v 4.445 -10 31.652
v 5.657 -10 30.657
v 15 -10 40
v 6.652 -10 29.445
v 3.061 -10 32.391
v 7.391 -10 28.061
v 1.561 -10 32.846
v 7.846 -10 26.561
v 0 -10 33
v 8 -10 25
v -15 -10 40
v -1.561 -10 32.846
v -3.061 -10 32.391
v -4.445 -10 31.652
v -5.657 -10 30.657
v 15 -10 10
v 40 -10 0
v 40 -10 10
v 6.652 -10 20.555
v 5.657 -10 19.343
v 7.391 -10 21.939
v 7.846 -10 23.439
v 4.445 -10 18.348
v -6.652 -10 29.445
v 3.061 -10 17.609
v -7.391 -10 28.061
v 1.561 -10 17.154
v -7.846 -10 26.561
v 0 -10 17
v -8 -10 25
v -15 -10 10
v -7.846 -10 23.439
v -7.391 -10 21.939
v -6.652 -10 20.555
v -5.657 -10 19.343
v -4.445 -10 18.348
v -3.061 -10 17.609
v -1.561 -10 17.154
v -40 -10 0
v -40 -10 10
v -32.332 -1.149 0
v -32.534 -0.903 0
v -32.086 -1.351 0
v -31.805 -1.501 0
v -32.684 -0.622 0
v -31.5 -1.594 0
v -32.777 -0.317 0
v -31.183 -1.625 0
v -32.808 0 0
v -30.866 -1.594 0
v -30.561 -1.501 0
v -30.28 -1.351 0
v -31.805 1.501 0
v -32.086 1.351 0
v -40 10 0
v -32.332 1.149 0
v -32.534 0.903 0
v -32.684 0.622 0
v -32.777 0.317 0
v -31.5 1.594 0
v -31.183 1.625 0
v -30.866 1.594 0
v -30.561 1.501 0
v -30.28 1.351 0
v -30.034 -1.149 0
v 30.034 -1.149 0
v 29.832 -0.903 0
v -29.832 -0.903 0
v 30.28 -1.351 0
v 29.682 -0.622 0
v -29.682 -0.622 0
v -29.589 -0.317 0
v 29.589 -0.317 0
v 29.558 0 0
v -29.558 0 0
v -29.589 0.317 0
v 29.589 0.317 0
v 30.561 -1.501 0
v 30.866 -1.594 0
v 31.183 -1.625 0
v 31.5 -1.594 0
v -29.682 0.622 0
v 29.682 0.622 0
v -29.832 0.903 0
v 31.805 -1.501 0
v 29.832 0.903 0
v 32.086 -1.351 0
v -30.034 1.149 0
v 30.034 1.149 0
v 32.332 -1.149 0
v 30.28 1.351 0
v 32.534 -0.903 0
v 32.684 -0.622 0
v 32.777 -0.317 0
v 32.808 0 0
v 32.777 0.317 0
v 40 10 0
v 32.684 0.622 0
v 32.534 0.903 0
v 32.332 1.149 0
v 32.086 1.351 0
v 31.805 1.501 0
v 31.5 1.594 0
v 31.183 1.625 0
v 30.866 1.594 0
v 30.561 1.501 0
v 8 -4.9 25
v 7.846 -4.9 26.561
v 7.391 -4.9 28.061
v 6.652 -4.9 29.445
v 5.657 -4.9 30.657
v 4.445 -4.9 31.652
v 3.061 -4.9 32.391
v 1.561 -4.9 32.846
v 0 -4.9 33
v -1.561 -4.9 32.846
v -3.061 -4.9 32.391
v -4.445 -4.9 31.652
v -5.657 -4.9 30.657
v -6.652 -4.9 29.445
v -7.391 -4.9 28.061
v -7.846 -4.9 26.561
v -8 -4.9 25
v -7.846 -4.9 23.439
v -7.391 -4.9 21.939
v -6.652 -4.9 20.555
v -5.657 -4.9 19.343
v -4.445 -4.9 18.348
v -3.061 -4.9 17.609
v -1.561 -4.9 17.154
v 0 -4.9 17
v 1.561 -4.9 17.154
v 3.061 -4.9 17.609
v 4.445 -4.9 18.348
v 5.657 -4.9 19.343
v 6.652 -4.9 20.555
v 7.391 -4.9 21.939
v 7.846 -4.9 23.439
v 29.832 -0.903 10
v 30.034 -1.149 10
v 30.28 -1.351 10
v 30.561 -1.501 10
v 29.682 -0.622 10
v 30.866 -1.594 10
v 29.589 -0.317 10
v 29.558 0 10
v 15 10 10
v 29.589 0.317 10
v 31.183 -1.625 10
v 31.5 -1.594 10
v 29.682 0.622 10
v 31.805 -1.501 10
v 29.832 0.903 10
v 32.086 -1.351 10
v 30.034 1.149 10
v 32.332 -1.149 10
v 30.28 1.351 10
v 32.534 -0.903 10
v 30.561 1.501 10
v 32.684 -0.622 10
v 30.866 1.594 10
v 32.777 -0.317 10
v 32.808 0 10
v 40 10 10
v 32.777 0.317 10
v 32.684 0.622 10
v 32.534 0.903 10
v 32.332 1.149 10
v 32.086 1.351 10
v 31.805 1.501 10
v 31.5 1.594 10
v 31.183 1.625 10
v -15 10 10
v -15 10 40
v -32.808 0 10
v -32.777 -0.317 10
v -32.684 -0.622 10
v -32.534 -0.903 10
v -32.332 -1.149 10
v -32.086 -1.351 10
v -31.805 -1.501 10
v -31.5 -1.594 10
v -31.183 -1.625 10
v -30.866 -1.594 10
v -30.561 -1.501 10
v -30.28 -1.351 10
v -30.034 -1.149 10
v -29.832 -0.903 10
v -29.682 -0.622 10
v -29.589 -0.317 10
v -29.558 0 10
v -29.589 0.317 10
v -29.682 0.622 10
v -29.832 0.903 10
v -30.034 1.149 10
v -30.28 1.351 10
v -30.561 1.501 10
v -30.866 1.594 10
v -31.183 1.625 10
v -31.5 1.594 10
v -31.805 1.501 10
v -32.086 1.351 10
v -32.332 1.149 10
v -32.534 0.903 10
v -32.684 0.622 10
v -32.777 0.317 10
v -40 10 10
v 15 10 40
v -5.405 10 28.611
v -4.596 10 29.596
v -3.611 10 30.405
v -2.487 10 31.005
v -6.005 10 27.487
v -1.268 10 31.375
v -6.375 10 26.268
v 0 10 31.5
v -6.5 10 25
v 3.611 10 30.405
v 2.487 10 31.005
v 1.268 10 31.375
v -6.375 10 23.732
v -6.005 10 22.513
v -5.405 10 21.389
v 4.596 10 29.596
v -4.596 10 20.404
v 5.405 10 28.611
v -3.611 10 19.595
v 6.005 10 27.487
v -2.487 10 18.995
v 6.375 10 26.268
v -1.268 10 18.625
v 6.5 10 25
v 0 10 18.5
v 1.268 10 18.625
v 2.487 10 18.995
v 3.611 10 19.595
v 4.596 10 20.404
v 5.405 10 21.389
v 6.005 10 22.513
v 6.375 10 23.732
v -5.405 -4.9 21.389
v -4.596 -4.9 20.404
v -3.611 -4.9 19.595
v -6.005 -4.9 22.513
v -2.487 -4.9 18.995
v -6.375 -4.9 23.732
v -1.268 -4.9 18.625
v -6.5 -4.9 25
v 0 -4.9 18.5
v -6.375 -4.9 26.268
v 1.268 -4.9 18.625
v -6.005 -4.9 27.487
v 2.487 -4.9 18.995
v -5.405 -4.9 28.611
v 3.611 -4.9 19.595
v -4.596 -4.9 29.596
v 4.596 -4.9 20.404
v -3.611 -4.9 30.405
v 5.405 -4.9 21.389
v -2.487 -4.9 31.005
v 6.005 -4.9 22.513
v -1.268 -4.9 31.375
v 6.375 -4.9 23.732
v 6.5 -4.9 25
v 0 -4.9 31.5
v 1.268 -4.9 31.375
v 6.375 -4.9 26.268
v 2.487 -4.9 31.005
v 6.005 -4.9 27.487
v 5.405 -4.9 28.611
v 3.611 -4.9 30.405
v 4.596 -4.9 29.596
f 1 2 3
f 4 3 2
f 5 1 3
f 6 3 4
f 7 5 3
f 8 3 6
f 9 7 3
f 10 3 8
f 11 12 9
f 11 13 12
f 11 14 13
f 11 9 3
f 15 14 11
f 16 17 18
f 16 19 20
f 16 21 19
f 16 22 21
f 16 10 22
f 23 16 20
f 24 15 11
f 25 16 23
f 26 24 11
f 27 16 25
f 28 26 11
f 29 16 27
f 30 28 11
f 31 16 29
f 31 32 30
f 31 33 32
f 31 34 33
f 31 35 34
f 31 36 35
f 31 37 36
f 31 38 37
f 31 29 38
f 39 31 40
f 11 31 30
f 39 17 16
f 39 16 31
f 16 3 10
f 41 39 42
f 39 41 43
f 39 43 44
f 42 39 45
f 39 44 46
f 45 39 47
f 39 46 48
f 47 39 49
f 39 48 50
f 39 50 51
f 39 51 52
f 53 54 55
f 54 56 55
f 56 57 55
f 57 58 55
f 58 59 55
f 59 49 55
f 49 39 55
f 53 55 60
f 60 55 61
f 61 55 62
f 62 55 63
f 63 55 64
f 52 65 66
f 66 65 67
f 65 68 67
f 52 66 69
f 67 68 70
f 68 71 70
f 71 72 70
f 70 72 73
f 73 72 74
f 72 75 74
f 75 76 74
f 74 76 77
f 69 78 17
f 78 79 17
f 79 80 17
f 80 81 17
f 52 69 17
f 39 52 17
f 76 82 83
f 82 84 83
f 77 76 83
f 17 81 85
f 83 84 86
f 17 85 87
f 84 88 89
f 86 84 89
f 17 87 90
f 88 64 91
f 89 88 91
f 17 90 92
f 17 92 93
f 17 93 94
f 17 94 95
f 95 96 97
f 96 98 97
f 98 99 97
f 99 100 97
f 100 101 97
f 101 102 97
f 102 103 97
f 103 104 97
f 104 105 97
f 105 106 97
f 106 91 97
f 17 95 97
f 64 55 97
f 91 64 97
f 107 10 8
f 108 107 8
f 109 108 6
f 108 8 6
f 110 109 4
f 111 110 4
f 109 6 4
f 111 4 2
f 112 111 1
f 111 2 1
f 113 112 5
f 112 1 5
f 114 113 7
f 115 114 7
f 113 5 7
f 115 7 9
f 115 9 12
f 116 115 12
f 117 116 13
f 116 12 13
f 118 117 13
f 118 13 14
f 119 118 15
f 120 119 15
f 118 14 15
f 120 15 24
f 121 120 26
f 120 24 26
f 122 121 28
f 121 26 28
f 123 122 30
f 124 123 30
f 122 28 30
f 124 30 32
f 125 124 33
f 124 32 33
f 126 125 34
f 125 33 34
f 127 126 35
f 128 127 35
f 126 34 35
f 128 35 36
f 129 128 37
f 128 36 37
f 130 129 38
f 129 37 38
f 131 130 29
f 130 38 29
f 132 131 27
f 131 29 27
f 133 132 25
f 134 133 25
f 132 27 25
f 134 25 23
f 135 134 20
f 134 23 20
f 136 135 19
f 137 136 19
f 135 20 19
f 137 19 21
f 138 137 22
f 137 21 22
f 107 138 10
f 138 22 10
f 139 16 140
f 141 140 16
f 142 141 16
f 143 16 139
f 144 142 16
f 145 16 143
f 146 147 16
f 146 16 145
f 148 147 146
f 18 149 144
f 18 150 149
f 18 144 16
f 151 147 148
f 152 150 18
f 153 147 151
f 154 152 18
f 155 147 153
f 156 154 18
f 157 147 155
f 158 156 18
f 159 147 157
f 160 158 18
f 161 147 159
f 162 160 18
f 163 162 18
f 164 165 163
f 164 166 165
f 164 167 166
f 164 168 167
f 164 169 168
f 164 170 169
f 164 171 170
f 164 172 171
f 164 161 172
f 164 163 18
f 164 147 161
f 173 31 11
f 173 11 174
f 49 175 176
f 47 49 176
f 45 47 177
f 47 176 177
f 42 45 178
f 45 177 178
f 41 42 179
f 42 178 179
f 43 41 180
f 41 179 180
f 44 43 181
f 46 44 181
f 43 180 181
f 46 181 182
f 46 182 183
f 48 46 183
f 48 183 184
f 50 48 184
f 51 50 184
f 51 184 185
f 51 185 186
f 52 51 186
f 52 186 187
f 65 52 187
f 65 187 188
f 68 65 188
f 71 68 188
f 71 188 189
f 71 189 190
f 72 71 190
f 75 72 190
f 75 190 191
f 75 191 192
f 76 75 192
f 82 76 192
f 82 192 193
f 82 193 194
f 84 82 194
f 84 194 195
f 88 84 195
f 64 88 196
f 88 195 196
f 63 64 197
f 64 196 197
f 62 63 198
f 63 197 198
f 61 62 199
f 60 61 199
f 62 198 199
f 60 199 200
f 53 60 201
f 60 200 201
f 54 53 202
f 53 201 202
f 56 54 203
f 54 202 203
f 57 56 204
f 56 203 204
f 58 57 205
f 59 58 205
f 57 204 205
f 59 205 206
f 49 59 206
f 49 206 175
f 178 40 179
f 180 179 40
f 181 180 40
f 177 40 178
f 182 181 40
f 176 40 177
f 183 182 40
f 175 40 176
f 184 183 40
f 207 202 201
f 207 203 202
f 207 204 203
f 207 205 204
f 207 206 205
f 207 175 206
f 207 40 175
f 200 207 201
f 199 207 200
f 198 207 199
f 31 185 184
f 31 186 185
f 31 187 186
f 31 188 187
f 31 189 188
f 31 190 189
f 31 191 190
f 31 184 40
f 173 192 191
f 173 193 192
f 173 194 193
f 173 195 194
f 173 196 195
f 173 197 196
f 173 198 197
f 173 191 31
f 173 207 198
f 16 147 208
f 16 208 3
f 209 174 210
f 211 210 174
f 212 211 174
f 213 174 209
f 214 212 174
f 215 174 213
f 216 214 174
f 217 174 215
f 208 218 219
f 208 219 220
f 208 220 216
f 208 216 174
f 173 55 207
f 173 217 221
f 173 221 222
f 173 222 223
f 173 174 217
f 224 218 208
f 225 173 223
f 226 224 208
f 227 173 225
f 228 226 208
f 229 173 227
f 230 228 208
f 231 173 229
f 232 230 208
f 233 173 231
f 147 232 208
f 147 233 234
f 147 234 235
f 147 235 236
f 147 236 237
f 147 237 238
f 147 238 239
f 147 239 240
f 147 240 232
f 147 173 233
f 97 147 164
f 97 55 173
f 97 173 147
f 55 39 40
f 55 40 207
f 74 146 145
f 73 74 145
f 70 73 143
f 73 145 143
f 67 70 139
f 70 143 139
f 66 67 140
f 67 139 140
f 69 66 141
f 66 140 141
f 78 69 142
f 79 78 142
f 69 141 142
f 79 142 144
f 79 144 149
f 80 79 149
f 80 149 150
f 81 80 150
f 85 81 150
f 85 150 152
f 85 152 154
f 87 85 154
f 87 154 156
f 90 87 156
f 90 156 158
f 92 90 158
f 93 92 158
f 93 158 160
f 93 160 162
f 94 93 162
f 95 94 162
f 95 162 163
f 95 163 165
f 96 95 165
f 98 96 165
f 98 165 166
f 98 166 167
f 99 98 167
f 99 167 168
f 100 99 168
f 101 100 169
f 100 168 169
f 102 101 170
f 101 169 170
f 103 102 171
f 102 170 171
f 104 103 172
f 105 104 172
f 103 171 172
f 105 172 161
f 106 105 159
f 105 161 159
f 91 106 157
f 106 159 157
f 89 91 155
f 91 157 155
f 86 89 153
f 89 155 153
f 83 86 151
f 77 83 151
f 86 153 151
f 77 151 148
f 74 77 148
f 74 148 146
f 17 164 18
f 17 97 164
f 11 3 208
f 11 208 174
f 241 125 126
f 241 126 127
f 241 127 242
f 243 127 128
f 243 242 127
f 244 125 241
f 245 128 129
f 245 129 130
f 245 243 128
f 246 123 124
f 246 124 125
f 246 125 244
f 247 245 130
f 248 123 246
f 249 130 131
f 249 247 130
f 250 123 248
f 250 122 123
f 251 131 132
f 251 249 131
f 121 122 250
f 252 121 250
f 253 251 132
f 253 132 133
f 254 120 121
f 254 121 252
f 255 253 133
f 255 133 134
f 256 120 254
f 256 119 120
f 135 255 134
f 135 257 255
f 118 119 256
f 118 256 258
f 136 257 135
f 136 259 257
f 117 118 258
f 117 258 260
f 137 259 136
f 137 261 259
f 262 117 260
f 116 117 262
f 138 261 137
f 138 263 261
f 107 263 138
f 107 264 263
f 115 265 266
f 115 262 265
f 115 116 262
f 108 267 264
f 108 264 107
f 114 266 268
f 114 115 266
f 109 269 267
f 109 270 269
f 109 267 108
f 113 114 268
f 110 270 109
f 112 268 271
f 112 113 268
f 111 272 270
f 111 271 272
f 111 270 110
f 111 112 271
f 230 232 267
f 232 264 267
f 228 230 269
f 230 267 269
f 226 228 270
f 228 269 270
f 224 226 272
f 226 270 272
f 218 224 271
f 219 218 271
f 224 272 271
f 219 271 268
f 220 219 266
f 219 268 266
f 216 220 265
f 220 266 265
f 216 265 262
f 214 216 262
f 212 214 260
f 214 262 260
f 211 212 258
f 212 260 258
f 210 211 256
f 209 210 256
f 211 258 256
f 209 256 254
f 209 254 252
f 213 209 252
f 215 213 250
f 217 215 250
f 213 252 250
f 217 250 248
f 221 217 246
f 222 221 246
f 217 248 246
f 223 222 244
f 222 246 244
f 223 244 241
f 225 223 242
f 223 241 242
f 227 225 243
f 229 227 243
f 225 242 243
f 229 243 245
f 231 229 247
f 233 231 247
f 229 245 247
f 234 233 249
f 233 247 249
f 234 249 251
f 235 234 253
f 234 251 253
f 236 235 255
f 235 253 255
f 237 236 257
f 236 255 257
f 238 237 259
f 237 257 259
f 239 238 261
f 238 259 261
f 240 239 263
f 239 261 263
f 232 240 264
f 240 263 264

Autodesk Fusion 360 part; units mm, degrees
sketch "Esquisse1" plane through (0, 0, 0) normal (0, 0, 1) x (1, 0, 0)
  line L0 (-40, 10) -> (40, 10)
  line L1 (40, 10) -> (40, -10)
  line L2 (40, -10) -> (-40, -10)
  line L3 (-40, -10) -> (-40, 10)
extrude "Extrusion1" add sketch "Esquisse1" along normal blind 10
sketch "Esquisse2" plane through (0, 0, 10) normal (0, 0, 1) x (-1, 0, 0)
  line L0 (40, 10) -> (-40, 10)
  line L1 (-40, 10) -> (-40, -10)
  line L2 (-40, -10) -> (40, -10)
  line L3 (40, -10) -> (40, 10)
  line L4 (15, -10) -> (-15, -10)
  line L5 (-15, -10) -> (-15, 10)
  line L6 (-15, 10) -> (15, 10)
  line L7 (15, 10) -> (15, -10)
  circle A0 centre (-31.183, 0) radius 1.625
  circle A1 centre (31.183, 0) radius 1.625
  dimension "d7" = 3.25
  dimension "d8" = 3.25
extrude "Extrusion2" cut sketch "Esquisse2" against normal blind 10 contours A1
extrude "Extrusion3" cut sketch "Esquisse2" against normal blind 10 contours A0
extrude "Extrusion4" add sketch "Esquisse2" along normal blind 30 contours L0 L2 L4 L5 L6 L7
sketch "Esquisse3" plane through (0, -10, 0) normal (0, -1, 0) x (1, 0, 0)
  line L0 (-40, 0) -> (40, 0)
  line L1 (40, 0) -> (40, 10)
  line L2 (40, 10) -> (15, 10)
  line L3 (15, 10) -> (15, 40)
  line L4 (15, 40) -> (-15, 40)
  line L5 (-15, 40) -> (-15, 10)
  line L6 (-15, 10) -> (-40, 10)
  line L7 (-40, 10) -> (-40, 0)
  circle A0 centre (0, 25) radius 6.5
  circle A1 centre (0, 25) radius 8
  dimension "d15" = 13
  dimension "d16" = 16
extrude "Extrusion5" cut sketch "Esquisse3" against normal blind 20 contours A0
extrude "Extrusion6" cut sketch "Esquisse3" against normal blind 5.1 contours A1
sketch "Esquisse4" plane through (0, 0, 40) normal (0, 0, 1) x (-1, 0, 0)
  line L0 (15, 10) -> (-15, 10)
  line L1 (-15, 10) -> (-15, -10)
  line L2 (-15, -10) -> (15, -10)
  line L3 (15, -10) -> (15, 10)
  line L4 (15, 10) -> (10, 10)
  line L5 (10, 10) -> (10, -5)
  line L6 (10, -5) -> (15, -5)
  line L7 (15, -5) -> (15, 10)
  line L8 (-15, 10) -> (-10, 10)
  line L9 (-10, 10) -> (-10, -5)
  line L10 (-10, -5) -> (-15, -5)
  line L11 (-15, -5) -> (-15, 10)
extrude "Extrusion7" add sketch "Esquisse4" along normal blind 10 contours L0 L3 L4 L5 L6 L7 | L0 L1 L8 L9 L10 L11
sketch "Esquisse5" plane through (0, 0, 50) normal (0, 0, 1) x (-1, 0, 0)
  line L0 (15, -5) -> (15, 10)
  line L1 (15, 10) -> (10, 10)
  line L2 (10, 10) -> (10, -5)
  line L3 (10, -5) -> (15, -5)
  line L4 (15, -5) -> (-15, -5)
  line L5 (-15, -5) -> (-15, 10)
  line L6 (-15, 10) -> (15, 10)
  line L7 (15, 10) -> (15, -5)
extrude "Extrusion8" add sketch "Esquisse5" along normal blind 5
extrude "Extrusion9" cut 1 faces at (-3.3333, 0, 55) along direction (0, 0, -1) blind 5
extrude "Extrusion10" cut 2 faces at (-13.3333, 0, 50) (13.3333, -5, 50) along direction (0, 0, -1) blind 10
